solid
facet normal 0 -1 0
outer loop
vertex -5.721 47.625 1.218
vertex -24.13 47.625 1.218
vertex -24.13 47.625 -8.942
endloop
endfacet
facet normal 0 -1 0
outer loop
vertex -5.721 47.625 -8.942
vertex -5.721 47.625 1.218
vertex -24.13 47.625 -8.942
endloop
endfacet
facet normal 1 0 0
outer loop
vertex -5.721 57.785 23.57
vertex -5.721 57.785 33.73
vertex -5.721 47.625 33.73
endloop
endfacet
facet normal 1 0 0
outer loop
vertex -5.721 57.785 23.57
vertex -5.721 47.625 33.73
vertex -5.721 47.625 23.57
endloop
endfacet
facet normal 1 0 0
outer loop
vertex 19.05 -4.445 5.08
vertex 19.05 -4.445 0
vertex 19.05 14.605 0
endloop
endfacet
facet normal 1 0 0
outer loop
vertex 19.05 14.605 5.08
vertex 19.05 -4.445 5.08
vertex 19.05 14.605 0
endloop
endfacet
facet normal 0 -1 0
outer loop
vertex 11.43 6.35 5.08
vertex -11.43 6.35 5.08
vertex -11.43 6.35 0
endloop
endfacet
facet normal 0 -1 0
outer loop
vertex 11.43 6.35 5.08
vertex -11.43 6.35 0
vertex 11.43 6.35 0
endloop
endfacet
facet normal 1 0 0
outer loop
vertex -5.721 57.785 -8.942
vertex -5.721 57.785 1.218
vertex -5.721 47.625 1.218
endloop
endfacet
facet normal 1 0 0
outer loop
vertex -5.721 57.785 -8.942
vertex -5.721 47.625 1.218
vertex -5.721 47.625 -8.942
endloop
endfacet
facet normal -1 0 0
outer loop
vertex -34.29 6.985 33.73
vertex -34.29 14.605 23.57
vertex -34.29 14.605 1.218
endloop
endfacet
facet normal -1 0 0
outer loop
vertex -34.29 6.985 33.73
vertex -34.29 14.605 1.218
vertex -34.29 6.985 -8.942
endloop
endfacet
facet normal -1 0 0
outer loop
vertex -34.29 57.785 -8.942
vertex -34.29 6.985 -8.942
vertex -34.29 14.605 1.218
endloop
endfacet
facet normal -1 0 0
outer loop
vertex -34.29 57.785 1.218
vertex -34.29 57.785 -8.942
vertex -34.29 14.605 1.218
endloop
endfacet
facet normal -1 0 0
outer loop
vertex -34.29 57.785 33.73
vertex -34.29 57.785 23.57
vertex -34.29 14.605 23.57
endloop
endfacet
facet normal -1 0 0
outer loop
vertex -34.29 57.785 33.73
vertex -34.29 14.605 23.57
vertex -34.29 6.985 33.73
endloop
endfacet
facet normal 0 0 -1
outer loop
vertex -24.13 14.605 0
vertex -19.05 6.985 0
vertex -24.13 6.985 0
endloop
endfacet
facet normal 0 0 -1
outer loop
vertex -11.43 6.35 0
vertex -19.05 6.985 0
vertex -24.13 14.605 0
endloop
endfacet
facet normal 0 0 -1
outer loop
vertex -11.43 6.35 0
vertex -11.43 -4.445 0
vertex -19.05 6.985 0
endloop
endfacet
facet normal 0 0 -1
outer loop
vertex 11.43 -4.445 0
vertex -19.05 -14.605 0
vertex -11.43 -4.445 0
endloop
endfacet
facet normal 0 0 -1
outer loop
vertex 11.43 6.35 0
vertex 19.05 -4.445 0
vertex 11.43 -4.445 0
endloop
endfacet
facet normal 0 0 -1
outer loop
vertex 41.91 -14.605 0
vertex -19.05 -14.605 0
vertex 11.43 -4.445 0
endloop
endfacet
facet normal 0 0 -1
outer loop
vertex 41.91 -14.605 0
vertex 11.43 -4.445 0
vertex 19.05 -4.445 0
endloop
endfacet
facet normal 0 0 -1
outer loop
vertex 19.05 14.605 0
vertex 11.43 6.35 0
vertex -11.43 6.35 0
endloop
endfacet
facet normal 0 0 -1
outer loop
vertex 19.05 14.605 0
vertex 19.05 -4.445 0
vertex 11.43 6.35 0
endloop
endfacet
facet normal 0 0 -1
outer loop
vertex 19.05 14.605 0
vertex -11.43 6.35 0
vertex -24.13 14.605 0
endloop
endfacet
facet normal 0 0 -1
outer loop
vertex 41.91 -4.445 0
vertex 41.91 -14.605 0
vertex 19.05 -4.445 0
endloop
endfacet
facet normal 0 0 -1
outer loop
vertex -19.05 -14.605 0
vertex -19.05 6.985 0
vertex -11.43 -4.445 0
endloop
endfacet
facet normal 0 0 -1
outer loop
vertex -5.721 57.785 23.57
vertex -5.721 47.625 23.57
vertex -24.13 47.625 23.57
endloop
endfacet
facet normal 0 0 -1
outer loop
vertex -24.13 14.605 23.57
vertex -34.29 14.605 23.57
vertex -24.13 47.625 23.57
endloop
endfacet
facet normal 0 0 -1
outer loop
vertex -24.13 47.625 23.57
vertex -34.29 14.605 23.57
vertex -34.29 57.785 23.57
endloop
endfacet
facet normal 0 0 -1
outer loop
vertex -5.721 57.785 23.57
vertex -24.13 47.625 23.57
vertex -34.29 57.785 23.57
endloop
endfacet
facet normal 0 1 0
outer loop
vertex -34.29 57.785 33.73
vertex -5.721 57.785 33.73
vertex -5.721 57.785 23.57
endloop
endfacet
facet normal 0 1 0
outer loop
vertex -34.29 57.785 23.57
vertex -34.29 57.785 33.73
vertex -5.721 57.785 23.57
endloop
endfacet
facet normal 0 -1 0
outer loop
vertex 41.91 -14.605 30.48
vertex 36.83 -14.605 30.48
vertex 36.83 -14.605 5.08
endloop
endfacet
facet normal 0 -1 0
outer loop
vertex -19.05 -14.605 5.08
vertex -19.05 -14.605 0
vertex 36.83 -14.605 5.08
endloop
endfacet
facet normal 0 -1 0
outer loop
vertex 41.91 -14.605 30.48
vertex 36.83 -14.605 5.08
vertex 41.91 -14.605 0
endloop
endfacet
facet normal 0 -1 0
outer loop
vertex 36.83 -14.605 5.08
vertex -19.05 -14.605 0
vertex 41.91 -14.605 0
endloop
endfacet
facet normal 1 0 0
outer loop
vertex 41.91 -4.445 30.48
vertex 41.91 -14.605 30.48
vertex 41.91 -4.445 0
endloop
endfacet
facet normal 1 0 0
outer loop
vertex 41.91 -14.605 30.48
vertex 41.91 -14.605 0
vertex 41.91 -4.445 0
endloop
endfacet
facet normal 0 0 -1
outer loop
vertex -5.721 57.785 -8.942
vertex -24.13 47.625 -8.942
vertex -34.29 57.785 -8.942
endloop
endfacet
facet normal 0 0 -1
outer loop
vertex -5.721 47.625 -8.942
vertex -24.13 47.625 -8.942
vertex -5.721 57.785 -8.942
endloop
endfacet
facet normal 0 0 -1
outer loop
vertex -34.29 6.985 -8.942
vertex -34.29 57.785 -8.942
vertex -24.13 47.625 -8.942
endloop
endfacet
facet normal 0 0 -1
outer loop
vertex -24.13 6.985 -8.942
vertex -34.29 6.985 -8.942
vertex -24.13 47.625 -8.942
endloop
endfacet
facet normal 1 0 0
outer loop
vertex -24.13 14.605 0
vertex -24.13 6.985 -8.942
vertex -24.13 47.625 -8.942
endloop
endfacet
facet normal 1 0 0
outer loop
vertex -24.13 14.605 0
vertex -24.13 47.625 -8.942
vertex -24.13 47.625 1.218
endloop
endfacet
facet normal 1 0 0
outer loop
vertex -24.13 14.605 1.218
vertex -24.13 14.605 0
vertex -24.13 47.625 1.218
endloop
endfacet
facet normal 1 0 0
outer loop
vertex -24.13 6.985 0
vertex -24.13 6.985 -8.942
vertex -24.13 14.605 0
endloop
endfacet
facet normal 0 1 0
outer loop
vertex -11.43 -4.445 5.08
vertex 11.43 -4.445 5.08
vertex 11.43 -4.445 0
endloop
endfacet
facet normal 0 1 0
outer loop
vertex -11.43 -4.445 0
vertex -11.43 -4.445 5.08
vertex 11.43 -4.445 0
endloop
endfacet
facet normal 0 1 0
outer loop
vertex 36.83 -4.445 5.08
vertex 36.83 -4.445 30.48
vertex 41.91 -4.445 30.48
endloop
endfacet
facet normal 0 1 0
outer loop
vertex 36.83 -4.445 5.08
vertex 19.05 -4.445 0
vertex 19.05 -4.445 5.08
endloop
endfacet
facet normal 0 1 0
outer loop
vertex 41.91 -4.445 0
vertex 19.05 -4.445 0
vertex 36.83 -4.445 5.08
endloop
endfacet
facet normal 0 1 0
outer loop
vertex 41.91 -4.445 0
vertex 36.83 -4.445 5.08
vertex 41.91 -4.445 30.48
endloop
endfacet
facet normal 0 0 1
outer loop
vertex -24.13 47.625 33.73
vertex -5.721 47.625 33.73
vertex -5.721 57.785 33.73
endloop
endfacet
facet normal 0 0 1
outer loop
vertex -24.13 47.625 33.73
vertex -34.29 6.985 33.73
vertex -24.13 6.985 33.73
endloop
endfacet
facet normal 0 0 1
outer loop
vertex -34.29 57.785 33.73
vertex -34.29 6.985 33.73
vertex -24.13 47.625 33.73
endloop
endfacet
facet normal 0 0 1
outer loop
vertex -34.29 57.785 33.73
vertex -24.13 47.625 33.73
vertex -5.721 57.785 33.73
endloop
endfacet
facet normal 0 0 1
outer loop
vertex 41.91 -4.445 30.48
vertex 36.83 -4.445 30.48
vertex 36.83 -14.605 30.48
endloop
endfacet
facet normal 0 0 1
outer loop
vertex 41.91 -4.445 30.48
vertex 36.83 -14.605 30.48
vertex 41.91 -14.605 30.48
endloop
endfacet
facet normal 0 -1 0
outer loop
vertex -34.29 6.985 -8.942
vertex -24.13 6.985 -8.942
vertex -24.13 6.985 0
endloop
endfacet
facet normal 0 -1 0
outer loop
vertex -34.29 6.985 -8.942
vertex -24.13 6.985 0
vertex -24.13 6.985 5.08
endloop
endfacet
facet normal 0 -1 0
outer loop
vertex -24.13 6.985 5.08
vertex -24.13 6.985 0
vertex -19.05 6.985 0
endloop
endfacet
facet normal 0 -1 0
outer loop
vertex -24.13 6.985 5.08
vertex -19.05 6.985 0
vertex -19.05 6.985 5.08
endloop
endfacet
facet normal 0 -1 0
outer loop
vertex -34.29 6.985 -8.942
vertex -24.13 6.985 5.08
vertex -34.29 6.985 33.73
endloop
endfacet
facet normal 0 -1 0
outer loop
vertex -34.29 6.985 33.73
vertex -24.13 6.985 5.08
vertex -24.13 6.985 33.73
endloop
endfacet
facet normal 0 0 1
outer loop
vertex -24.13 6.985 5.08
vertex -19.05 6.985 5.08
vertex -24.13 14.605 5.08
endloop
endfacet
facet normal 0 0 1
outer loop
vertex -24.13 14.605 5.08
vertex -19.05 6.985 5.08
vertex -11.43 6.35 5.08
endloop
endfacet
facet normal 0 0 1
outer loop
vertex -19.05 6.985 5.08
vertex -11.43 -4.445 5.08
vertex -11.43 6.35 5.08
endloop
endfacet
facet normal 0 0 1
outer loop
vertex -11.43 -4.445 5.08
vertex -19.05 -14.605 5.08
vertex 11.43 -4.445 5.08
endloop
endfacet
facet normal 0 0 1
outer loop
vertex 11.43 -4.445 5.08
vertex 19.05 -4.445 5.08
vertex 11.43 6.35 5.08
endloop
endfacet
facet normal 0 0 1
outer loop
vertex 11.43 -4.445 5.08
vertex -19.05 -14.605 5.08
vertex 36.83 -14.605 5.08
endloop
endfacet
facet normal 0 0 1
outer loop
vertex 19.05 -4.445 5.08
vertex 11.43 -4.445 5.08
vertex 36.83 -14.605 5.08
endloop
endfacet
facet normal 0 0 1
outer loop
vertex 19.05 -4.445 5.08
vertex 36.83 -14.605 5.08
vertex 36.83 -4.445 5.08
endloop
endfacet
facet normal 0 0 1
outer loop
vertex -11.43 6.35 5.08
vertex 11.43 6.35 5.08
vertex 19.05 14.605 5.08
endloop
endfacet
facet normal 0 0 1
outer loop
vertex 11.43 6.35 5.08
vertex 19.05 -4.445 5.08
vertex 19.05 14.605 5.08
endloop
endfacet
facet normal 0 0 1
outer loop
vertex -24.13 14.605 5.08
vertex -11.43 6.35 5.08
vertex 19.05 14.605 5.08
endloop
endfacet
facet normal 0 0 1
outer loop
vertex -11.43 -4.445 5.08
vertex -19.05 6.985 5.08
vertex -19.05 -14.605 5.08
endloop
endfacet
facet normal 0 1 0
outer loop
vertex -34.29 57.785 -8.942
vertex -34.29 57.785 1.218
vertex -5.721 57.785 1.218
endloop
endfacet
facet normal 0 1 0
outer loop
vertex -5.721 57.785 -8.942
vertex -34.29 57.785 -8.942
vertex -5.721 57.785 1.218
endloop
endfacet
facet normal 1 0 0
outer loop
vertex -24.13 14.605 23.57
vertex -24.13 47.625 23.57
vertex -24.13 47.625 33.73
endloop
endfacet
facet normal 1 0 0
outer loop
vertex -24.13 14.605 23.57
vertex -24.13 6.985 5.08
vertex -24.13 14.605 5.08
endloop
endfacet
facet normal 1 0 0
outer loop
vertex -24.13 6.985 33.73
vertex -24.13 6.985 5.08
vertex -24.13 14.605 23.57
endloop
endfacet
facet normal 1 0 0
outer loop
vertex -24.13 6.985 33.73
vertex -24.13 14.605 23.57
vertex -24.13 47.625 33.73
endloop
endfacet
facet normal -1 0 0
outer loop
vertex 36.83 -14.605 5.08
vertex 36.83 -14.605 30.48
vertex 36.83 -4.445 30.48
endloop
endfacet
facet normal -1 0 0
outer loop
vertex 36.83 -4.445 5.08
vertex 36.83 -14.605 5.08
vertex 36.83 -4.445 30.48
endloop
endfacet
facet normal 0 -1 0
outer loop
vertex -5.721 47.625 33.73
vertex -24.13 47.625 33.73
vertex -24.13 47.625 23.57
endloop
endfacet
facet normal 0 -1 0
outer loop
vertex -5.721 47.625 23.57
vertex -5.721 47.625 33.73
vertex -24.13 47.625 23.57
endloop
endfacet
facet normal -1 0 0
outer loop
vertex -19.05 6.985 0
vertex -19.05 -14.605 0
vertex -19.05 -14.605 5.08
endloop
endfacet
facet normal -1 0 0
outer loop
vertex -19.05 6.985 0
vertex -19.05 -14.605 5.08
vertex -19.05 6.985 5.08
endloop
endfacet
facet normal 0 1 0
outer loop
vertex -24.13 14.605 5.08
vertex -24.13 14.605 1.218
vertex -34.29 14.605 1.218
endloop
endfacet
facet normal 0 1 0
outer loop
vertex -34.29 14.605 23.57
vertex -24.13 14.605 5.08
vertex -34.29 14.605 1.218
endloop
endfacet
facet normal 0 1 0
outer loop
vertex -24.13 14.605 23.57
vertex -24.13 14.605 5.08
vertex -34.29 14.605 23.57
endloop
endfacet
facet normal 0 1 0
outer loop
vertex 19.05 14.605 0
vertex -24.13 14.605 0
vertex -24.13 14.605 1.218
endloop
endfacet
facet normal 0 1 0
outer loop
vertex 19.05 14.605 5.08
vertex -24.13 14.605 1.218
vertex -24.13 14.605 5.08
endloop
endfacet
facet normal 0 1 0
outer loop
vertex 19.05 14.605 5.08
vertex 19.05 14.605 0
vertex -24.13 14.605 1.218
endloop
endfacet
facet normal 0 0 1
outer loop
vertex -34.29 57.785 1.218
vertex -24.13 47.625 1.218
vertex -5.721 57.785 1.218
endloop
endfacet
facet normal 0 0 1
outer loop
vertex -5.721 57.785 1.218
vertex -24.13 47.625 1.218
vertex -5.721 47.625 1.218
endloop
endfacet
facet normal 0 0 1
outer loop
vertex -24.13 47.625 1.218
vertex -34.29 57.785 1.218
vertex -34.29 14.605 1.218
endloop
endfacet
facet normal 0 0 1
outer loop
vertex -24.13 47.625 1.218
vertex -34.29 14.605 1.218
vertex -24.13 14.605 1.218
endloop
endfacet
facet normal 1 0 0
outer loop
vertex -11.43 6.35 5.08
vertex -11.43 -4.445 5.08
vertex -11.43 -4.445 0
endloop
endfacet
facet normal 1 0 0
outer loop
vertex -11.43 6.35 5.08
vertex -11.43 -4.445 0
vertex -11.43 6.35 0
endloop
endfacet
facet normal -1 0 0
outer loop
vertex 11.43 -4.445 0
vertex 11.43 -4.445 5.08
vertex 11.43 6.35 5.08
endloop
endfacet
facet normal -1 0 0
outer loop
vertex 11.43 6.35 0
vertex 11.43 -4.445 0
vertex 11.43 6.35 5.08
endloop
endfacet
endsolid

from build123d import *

# Parameters (mm, degrees)
SKETCH2_W                       = 38.1
SKETCH2_H                       = 29.21
BOSS_EXTRUDE1_DEPTH             = 5.08
SKETCH3_W                       = 22.86
SKETCH3_H                       = 12.7
CUT_EXTRUDE1_DEPTH              = 5.08
SKETCH5_W                       = 5.08
SKETCH5_H                       = 7.62
BOSS_EXTRUDE2_DEPTH             = 10.16
SKETCH7_W                       = 5.08
SKETCH7_H                       = 7.62
BOSS_EXTRUDE3_DEPTH             = 18.49
SKETCH8_W                       = 10.16
SKETCH8_H                       = 10.16
BOSS_EXTRUDE4_DEPTH             = 50.8
SKETCH9_W                       = 10.16
SKETCH9_H                       = 10.16
BOSS_EXTRUDE5_DEPTH             = 18.408905777
SKETCH11_W                      = 5.08
SKETCH11_H                      = 10.16
BOSS_EXTRUDE6_DEPTH             = 22.86
BOSS_EXTRUDE6_DIRECTION_2_REACH = 87.569
SKETCH12_W                      = 5.08
SKETCH12_H                      = 10.16
BOSS_EXTRUDE7_DEPTH             = 25.4
SKETCH13_W                      = 22.352
SKETCH13_H                      = 7.62
BOSS_EXTRUDE8_DEPTH             = 5.08


with BuildPart() as part:
    # Sketch2 → Boss-Extrude1 (new body)
    with BuildSketch(Plane.XY):
        Rectangle(SKETCH2_W, SKETCH2_H)
    extrude(amount=BOSS_EXTRUDE1_DEPTH)

    # Sketch3 → Cut-Extrude1 (cut)
    with BuildSketch(Plane.XY.offset(5.08)):
        Rectangle(SKETCH3_W, SKETCH3_H)
    extrude(amount=-CUT_EXTRUDE1_DEPTH, mode=Mode.SUBTRACT)

    # Sketch5 → Boss-Extrude2 (add)
    with BuildSketch(Plane.ZY.offset(19.05)):
        with Locations((2.54, 10.795)):
            Rectangle(SKETCH5_W, SKETCH5_H)
    extrude(amount=BOSS_EXTRUDE2_DEPTH)

    # Sketch7 → Boss-Extrude3 (add)
    with BuildSketch(Plane.XY.offset(5.08)):
        with Locations((-26.67, 10.795)):
            Rectangle(SKETCH7_W, SKETCH7_H)
    extrude(amount=BOSS_EXTRUDE3_DEPTH)

    # Sketch8 → Boss-Extrude4 (add)
    with BuildSketch(Plane.XZ.offset(-6.985)):
        with Locations((-29.21, 28.65)):
            Rectangle(SKETCH8_W, SKETCH8_H)
        with Locations((-29.21, -3.862)):
            Rectangle(SKETCH8_W, SKETCH8_H)
    extrude(amount=-BOSS_EXTRUDE4_DEPTH)

    # Sketch9 → Boss-Extrude5 (add)
    with BuildSketch(Plane(origin=(-24.13, 0, 0), x_dir=(0, 0, -1), z_dir=(1, 0, 0))):
        with Locations((-28.65, 52.705)):
            Rectangle(SKETCH9_W, SKETCH9_H)
        with Locations((3.862, 52.705)):
            Rectangle(SKETCH9_W, SKETCH9_H)
    extrude(amount=BOSS_EXTRUDE5_DEPTH)

    # Sketch11 → Boss-Extrude6 (add)
    with BuildSketch(Plane(origin=(19.05, 0, 0), x_dir=(0, 0, -1), z_dir=(1, 0, 0))):
        with Locations((-2.54, -9.525)):
            Rectangle(SKETCH11_W, SKETCH11_H)
    extrude(amount=BOSS_EXTRUDE6_DEPTH)

    # Sketch11 → Boss-Extrude6 direction 2 (add, up to next)
    with BuildSketch(Plane(origin=(19.05, 0, 0), x_dir=(0, 0, -1), z_dir=(1, 0, 0)), mode=Mode.PRIVATE) as boss_extrude6_direction_2_sk1:
        with Locations((-2.54, -9.525)):
            Rectangle(SKETCH11_W, SKETCH11_H)
    boss_extrude6_direction_2_tool1 = extrude(boss_extrude6_direction_2_sk1.sketch, amount=-BOSS_EXTRUDE6_DIRECTION_2_REACH, mode=Mode.PRIVATE) - part.part
    add(boss_extrude6_direction_2_tool1.solids().sort_by_distance((19.05, -9.525, 2.54))[0])

    # Sketch12 → Boss-Extrude7 (add)
    with BuildSketch(Plane.XY.offset(5.08)):
        with Locations((39.37, -9.525)):
            Rectangle(SKETCH12_W, SKETCH12_H)
    extrude(amount=BOSS_EXTRUDE7_DEPTH)

    # Sketch13 → Boss-Extrude8 (add)
    with BuildSketch(Plane.ZY.offset(29.21)):
        with Locations((12.394, 10.795)):
            Rectangle(SKETCH13_W, SKETCH13_H)
    extrude(amount=BOSS_EXTRUDE8_DEPTH)


solid = part.part
